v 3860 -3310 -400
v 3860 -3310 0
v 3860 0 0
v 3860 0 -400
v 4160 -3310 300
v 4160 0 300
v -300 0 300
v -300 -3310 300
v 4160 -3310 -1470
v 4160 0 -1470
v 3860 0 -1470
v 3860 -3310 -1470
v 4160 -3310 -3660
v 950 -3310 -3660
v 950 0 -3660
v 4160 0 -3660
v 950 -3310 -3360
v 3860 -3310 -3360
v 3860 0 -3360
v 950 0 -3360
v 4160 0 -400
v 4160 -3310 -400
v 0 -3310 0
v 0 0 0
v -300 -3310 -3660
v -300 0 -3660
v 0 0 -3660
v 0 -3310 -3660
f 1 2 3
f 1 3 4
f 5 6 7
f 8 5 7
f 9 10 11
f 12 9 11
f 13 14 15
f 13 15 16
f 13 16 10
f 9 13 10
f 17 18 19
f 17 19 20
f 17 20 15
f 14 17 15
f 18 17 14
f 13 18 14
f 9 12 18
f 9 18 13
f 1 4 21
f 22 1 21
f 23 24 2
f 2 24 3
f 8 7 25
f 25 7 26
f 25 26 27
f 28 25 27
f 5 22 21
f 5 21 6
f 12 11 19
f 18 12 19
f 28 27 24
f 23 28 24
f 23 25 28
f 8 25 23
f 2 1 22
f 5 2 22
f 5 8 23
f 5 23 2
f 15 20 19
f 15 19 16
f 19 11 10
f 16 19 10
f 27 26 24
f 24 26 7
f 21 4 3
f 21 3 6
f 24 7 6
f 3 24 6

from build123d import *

# Parameters (mm, degrees)
F1_DEPTH = 3310


with BuildPart() as f1:
    # F0 (on Front) → F1 (new body)
    with BuildSketch(Plane.XZ):
        Polygon((0, -3360), (0, 0), (3860, 0), (3860, -400), (4160, -400), (4160, 300), (-300, 300), (-300, -3660), (0, -3660), align=None)
        Polygon((3860, -3360), (950, -3360), (950, -3660), (4160, -3660), (4160, -1470), (3860, -1470), align=None)
    extrude(amount=F1_DEPTH)


solid = f1.part
